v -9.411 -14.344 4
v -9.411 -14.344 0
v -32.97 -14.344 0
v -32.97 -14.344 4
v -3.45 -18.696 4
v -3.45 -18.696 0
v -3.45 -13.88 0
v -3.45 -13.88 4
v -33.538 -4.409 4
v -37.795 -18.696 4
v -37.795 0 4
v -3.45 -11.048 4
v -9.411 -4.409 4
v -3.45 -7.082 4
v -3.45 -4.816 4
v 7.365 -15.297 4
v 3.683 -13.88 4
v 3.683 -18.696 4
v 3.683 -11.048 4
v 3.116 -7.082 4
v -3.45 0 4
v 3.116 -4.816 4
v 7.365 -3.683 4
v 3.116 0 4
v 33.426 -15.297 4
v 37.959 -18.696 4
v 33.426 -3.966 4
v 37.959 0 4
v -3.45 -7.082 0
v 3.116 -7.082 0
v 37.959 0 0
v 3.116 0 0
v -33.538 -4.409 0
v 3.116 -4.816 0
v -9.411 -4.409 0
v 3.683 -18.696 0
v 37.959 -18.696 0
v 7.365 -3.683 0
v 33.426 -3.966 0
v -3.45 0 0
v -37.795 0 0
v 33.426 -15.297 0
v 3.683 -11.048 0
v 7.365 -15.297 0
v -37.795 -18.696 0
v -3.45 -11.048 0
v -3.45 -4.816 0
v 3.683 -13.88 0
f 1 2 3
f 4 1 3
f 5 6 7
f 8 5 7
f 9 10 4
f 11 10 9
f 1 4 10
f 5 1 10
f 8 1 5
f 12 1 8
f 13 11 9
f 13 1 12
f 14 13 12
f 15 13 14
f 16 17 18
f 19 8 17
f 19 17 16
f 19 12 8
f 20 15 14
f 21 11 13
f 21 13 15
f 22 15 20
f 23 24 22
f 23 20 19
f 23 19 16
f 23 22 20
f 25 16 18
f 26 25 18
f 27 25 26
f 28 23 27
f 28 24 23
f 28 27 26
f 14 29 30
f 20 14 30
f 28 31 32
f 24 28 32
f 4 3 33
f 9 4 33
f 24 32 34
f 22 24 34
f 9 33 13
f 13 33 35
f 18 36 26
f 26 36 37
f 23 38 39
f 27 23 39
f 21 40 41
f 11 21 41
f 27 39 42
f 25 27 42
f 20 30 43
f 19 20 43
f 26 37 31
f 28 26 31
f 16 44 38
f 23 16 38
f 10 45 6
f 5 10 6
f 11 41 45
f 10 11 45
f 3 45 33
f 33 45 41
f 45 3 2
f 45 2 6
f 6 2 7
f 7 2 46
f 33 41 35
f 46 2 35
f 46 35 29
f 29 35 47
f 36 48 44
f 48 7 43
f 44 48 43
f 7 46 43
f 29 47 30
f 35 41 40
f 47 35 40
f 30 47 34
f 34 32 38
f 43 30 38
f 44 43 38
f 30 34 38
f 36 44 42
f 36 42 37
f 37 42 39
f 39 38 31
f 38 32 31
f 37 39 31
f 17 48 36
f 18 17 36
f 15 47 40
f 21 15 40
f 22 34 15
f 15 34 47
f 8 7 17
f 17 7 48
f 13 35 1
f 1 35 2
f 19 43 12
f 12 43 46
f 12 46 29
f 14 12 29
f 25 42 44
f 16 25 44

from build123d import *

# Parameters (mm, degrees)
F0_W     = 3.4498951863
F0_H     = 2.832734026
F0_H_2   = 2.2661872208
F1_DEPTH = 4


with BuildPart() as f1:
    # F0 (on Top) → F1 (new body)
    with BuildSketch(Plane.XY):
        with Locations((-1.7249475932, -12.4640292488)):
            Rectangle(F0_W, F0_H)
        with Locations((-1.7249475932, -5.9487414546)):
            Rectangle(F0_W, F0_H_2)
        Polygon((18.1294977665, 0), (3.1160083599, 0), (3.1160083599, -4.8156478442), (0, -4.8156478442), (0, -7.081835065), (3.1160083599, -7.081835065), (3.6825551651, -11.0476622358), (0, -11.0476622358), (0, -13.8803962618), (3.6825551651, -13.8803962618), (3.6825551651, -18.6960436404), (37.9586368799, -18.6960436404), (37.9586368799, 0), (32.2931706905, 0), align=None)
        Polygon((7.3651084676, -3.682554001), (33.4262624383, -3.9658271708), (33.4262624383, -15.2967637405), (7.3651084676, -15.2967637405), align=None, mode=Mode.SUBTRACT)
        Polygon((-3.4498951863, -7.081835065), (-3.4498951863, -4.8156478442), (-3.4498951863, 0), (-6.85604522, 0), (-37.7952493727, 0), (-37.7952493727, -18.6960436404), (-3.4498951863, -18.6960436404), (-3.4498951863, -13.8803962618), (-3.4498951863, -11.0476622358), align=None)
        Polygon((-32.9698696733, -14.3438782543), (-33.5375629365, -4.4092708267), (-9.4106579199, -4.4092708267), (-9.4106579199, -14.3438782543), align=None, mode=Mode.SUBTRACT)
    extrude(amount=F1_DEPTH)


solid = f1.part
